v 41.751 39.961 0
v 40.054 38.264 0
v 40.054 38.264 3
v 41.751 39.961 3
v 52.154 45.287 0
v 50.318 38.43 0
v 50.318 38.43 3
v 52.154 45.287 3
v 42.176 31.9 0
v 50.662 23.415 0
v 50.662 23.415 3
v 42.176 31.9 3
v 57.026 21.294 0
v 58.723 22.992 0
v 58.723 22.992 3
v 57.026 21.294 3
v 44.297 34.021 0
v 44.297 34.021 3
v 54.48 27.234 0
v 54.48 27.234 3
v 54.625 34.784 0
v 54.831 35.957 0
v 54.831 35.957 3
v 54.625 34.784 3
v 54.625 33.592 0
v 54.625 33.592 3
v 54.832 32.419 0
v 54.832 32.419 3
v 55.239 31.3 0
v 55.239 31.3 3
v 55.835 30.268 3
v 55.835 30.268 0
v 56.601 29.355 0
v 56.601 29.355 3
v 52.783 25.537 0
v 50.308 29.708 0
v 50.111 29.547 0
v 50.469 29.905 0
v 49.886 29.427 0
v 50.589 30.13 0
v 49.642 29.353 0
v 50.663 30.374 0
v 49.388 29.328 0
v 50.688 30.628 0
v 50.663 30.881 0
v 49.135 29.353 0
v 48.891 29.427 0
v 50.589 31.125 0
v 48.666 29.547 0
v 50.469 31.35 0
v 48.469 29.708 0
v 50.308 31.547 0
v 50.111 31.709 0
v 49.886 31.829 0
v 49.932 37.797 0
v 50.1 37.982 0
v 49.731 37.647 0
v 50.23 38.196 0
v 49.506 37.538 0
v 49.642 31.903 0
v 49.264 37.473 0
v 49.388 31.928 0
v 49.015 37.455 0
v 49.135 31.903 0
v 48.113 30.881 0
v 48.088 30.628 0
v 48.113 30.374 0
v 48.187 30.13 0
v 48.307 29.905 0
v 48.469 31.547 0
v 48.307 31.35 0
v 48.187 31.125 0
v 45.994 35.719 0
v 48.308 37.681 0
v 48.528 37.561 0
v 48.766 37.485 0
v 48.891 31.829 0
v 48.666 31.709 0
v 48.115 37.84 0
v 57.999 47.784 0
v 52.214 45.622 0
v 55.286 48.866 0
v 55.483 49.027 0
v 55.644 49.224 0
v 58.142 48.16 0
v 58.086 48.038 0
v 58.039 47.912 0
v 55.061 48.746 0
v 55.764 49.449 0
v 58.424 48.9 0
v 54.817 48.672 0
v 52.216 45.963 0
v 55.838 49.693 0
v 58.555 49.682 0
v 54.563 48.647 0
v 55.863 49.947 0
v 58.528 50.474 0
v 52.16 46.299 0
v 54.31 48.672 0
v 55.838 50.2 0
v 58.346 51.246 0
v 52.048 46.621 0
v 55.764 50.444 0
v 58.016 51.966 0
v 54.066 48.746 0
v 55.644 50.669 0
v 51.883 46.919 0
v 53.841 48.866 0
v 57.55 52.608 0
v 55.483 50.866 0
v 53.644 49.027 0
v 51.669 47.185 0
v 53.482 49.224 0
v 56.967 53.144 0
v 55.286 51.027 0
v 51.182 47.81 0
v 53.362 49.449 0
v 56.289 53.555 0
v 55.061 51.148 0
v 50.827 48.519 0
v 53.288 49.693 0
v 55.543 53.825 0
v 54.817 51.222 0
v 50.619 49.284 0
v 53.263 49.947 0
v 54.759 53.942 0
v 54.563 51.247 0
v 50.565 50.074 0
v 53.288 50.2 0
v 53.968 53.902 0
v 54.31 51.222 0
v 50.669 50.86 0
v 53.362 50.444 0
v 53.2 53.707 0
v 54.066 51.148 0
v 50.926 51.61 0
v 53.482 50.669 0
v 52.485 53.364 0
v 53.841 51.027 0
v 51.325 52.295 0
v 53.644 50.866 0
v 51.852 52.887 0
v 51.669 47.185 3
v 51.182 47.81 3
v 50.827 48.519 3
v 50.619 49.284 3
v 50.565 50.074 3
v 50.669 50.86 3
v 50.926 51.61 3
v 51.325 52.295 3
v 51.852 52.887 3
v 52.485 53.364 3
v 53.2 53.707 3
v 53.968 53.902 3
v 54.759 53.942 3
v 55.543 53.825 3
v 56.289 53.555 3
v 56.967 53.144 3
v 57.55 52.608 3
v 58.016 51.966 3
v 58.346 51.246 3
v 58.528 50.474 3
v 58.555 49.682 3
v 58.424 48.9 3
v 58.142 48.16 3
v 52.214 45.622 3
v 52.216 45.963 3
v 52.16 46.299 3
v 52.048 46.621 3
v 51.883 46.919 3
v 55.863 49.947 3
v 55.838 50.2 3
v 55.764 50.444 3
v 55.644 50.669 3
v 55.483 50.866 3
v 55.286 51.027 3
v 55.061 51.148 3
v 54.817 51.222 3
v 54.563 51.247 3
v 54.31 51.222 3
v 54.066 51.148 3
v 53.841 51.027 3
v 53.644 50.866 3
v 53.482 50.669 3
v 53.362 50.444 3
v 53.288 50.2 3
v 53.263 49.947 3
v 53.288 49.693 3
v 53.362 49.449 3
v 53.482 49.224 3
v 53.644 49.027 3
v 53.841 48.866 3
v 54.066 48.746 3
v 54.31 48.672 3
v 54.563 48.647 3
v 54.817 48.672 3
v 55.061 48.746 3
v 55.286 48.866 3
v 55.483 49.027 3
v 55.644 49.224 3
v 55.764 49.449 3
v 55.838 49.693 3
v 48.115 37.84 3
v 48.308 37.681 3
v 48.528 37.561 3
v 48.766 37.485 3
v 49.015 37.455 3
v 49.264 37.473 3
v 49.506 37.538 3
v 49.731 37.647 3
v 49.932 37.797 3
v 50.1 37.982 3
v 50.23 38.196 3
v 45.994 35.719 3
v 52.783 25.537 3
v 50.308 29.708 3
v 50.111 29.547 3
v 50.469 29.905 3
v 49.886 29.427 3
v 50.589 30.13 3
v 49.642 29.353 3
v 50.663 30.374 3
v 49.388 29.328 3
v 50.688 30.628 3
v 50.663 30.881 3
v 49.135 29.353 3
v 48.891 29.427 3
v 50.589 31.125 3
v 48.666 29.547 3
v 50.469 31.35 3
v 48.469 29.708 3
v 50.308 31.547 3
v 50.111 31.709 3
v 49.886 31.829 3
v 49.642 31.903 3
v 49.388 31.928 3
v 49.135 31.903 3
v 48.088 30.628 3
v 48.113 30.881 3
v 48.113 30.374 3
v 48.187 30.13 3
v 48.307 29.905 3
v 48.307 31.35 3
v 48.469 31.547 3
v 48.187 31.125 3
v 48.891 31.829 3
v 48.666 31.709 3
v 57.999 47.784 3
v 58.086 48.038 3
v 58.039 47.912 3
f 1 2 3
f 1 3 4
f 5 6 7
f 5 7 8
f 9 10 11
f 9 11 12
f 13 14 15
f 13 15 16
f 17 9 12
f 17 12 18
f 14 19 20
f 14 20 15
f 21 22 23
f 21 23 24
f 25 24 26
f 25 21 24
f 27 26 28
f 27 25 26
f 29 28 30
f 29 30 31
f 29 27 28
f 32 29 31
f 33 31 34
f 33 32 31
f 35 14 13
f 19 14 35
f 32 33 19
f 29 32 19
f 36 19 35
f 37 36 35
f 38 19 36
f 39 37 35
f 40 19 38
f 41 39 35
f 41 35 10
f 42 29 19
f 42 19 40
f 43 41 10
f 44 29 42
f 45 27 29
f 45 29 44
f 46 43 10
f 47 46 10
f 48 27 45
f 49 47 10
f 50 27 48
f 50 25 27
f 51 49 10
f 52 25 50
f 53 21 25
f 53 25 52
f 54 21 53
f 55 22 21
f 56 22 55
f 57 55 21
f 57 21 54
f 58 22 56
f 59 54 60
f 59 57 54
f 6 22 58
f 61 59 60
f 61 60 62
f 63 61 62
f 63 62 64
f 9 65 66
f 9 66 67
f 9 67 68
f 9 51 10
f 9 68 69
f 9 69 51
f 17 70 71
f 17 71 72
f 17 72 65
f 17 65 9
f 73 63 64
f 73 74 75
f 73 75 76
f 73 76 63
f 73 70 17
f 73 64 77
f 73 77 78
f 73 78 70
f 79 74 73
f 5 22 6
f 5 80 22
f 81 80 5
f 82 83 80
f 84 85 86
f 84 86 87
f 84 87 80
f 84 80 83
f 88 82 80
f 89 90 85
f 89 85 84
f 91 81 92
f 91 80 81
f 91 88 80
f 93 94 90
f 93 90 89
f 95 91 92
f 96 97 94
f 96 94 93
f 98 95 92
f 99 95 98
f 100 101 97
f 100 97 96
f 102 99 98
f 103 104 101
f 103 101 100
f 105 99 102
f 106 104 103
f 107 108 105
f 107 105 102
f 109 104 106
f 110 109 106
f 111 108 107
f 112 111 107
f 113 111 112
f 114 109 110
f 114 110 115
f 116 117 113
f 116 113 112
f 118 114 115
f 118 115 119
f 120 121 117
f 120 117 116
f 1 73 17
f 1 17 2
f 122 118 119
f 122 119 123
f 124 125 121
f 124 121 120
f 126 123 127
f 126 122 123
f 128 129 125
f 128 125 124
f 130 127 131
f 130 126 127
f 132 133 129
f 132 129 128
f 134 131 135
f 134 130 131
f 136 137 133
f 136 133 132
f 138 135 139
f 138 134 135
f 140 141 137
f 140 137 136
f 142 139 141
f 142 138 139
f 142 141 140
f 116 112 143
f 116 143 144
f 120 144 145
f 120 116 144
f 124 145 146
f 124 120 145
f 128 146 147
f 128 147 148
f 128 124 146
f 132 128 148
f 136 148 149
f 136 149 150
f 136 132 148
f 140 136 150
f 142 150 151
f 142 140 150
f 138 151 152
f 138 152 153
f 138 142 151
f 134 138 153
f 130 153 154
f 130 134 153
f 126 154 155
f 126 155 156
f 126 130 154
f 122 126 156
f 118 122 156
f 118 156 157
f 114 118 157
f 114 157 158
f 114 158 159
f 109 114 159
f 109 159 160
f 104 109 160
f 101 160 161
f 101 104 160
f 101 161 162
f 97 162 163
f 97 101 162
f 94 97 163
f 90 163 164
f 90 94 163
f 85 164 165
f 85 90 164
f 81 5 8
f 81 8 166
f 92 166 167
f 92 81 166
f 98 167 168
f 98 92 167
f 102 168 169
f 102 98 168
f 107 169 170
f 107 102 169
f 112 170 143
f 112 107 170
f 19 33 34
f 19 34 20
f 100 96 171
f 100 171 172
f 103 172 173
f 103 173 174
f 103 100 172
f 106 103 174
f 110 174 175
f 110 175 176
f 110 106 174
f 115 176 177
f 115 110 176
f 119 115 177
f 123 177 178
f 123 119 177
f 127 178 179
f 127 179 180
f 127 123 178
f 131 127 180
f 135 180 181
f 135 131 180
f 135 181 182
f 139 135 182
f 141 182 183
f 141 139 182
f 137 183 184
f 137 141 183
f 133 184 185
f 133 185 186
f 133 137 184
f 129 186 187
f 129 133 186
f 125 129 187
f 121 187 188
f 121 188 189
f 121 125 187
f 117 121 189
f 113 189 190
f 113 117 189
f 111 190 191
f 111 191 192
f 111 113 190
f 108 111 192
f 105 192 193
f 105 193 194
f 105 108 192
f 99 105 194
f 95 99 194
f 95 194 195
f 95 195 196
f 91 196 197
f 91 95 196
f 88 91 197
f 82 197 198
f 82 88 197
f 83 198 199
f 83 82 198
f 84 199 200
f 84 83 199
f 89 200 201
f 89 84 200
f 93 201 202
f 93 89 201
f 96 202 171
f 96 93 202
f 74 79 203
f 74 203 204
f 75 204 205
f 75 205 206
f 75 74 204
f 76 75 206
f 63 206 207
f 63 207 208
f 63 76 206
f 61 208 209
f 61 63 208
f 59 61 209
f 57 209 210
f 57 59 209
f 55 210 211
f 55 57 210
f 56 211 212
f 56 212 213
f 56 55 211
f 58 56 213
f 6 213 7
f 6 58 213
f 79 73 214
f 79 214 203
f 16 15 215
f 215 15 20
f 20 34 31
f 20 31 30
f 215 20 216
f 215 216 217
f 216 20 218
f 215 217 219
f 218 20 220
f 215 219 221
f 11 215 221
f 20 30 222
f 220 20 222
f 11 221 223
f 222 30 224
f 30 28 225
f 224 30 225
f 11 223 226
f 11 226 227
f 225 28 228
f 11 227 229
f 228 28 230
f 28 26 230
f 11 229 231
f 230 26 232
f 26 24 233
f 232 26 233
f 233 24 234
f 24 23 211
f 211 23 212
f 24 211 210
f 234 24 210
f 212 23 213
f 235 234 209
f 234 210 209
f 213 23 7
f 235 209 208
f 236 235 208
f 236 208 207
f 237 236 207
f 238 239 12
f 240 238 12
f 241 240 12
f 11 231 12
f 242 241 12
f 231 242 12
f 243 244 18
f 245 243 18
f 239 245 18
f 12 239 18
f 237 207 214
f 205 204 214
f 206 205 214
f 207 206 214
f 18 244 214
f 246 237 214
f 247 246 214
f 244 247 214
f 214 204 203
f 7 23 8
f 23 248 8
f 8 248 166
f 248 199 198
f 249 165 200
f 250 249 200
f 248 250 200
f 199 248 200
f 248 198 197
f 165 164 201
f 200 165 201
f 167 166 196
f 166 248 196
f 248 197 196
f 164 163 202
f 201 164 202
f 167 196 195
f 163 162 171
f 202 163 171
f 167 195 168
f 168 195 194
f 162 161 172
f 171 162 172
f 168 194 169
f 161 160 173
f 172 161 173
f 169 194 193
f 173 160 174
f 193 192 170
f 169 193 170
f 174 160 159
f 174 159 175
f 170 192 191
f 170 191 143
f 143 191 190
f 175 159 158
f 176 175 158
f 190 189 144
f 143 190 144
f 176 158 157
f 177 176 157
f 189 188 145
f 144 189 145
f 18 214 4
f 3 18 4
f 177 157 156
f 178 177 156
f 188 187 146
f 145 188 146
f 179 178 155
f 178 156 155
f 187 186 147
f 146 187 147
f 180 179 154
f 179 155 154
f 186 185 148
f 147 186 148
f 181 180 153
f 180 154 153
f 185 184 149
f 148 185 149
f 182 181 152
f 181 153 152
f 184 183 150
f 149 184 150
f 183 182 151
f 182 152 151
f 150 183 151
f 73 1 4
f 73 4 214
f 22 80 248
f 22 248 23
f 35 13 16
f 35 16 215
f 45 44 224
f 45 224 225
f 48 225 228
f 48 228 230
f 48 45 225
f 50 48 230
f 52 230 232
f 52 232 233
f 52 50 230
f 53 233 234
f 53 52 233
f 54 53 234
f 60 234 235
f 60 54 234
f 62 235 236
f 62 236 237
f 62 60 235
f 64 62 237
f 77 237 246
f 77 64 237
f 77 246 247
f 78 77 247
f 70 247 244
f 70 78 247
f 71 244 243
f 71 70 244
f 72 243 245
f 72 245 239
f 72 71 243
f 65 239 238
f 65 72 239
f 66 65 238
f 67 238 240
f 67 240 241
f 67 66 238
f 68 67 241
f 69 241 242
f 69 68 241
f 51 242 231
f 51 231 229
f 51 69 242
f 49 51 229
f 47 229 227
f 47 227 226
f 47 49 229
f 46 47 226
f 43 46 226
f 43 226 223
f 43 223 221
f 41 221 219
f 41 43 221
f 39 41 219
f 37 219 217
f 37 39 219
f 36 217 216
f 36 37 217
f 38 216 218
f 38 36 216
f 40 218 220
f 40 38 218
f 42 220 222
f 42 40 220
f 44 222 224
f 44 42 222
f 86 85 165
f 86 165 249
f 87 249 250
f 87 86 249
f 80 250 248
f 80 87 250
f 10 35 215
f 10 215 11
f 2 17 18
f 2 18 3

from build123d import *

# Parameters (mm, degrees)
MODEL_R             = 1.300000004
MODEL_R_2           = 1.300000002
BOSS_EXTRUDE1_DEPTH = 3


with BuildPart() as part:
    # Model → Boss-Extrude1 (new body)
    with BuildSketch(Plane.XY):
        with BuildLine():
            Line((40.053989941, 38.263739991), (41.750869933, 39.960959983))
            Line((41.750869933, 39.960959983), (45.993869928, 35.718559999))
            Line((45.993869928, 35.718559999), (48.115019916, 37.840109993))
            ThreePointArc((48.115019916, 37.840109993), (49.386777149, 37.499408798), (50.317678177, 38.430465746))
            Line((50.317678177, 38.430465746), (52.154393357, 45.286895639))
            ThreePointArc((52.154393357, 45.286895639), (52.160230302, 46.299486533), (51.669359128, 47.185161347))
            ThreePointArc((51.669359128, 47.185161347), (53.96779664, 53.902048674), (58.141990239, 48.159619035))
            ThreePointArc((58.141990239, 48.159619035), (58.061248273, 47.975250139), (57.99941682, 47.783708953))
            Line((57.99941682, 47.783708953), (54.831453076, 35.957184914))
            ThreePointArc((54.831453076, 35.957184914), (54.831683355, 32.419225016), (56.600919899, 29.355410018))
            Line((56.600919899, 29.355410018), (54.479669903, 27.233960017))
            Line((54.479669903, 27.233960017), (58.722669898, 22.991560033))
            Line((58.722669898, 22.991560033), (57.025689898, 21.294440033))
            Line((57.025689898, 21.294440033), (52.782789911, 25.536740025))
            Line((52.782789911, 25.536740025), (50.661639908, 23.415390031))
            Line((50.661639908, 23.415390031), (42.175739933, 31.899990006))
            Line((42.175739933, 31.899990006), (44.296889928, 34.02144))
            Line((44.296889928, 34.02144), (40.053989941, 38.263739991))
        make_face()
        with Locations((49.388329912, 30.627700012)):
            Circle(MODEL_R, mode=Mode.SUBTRACT)
        with Locations((54.563263872, 49.946565983)):
            Circle(MODEL_R_2, mode=Mode.SUBTRACT)
    extrude(amount=BOSS_EXTRUDE1_DEPTH)


solid = part.part
